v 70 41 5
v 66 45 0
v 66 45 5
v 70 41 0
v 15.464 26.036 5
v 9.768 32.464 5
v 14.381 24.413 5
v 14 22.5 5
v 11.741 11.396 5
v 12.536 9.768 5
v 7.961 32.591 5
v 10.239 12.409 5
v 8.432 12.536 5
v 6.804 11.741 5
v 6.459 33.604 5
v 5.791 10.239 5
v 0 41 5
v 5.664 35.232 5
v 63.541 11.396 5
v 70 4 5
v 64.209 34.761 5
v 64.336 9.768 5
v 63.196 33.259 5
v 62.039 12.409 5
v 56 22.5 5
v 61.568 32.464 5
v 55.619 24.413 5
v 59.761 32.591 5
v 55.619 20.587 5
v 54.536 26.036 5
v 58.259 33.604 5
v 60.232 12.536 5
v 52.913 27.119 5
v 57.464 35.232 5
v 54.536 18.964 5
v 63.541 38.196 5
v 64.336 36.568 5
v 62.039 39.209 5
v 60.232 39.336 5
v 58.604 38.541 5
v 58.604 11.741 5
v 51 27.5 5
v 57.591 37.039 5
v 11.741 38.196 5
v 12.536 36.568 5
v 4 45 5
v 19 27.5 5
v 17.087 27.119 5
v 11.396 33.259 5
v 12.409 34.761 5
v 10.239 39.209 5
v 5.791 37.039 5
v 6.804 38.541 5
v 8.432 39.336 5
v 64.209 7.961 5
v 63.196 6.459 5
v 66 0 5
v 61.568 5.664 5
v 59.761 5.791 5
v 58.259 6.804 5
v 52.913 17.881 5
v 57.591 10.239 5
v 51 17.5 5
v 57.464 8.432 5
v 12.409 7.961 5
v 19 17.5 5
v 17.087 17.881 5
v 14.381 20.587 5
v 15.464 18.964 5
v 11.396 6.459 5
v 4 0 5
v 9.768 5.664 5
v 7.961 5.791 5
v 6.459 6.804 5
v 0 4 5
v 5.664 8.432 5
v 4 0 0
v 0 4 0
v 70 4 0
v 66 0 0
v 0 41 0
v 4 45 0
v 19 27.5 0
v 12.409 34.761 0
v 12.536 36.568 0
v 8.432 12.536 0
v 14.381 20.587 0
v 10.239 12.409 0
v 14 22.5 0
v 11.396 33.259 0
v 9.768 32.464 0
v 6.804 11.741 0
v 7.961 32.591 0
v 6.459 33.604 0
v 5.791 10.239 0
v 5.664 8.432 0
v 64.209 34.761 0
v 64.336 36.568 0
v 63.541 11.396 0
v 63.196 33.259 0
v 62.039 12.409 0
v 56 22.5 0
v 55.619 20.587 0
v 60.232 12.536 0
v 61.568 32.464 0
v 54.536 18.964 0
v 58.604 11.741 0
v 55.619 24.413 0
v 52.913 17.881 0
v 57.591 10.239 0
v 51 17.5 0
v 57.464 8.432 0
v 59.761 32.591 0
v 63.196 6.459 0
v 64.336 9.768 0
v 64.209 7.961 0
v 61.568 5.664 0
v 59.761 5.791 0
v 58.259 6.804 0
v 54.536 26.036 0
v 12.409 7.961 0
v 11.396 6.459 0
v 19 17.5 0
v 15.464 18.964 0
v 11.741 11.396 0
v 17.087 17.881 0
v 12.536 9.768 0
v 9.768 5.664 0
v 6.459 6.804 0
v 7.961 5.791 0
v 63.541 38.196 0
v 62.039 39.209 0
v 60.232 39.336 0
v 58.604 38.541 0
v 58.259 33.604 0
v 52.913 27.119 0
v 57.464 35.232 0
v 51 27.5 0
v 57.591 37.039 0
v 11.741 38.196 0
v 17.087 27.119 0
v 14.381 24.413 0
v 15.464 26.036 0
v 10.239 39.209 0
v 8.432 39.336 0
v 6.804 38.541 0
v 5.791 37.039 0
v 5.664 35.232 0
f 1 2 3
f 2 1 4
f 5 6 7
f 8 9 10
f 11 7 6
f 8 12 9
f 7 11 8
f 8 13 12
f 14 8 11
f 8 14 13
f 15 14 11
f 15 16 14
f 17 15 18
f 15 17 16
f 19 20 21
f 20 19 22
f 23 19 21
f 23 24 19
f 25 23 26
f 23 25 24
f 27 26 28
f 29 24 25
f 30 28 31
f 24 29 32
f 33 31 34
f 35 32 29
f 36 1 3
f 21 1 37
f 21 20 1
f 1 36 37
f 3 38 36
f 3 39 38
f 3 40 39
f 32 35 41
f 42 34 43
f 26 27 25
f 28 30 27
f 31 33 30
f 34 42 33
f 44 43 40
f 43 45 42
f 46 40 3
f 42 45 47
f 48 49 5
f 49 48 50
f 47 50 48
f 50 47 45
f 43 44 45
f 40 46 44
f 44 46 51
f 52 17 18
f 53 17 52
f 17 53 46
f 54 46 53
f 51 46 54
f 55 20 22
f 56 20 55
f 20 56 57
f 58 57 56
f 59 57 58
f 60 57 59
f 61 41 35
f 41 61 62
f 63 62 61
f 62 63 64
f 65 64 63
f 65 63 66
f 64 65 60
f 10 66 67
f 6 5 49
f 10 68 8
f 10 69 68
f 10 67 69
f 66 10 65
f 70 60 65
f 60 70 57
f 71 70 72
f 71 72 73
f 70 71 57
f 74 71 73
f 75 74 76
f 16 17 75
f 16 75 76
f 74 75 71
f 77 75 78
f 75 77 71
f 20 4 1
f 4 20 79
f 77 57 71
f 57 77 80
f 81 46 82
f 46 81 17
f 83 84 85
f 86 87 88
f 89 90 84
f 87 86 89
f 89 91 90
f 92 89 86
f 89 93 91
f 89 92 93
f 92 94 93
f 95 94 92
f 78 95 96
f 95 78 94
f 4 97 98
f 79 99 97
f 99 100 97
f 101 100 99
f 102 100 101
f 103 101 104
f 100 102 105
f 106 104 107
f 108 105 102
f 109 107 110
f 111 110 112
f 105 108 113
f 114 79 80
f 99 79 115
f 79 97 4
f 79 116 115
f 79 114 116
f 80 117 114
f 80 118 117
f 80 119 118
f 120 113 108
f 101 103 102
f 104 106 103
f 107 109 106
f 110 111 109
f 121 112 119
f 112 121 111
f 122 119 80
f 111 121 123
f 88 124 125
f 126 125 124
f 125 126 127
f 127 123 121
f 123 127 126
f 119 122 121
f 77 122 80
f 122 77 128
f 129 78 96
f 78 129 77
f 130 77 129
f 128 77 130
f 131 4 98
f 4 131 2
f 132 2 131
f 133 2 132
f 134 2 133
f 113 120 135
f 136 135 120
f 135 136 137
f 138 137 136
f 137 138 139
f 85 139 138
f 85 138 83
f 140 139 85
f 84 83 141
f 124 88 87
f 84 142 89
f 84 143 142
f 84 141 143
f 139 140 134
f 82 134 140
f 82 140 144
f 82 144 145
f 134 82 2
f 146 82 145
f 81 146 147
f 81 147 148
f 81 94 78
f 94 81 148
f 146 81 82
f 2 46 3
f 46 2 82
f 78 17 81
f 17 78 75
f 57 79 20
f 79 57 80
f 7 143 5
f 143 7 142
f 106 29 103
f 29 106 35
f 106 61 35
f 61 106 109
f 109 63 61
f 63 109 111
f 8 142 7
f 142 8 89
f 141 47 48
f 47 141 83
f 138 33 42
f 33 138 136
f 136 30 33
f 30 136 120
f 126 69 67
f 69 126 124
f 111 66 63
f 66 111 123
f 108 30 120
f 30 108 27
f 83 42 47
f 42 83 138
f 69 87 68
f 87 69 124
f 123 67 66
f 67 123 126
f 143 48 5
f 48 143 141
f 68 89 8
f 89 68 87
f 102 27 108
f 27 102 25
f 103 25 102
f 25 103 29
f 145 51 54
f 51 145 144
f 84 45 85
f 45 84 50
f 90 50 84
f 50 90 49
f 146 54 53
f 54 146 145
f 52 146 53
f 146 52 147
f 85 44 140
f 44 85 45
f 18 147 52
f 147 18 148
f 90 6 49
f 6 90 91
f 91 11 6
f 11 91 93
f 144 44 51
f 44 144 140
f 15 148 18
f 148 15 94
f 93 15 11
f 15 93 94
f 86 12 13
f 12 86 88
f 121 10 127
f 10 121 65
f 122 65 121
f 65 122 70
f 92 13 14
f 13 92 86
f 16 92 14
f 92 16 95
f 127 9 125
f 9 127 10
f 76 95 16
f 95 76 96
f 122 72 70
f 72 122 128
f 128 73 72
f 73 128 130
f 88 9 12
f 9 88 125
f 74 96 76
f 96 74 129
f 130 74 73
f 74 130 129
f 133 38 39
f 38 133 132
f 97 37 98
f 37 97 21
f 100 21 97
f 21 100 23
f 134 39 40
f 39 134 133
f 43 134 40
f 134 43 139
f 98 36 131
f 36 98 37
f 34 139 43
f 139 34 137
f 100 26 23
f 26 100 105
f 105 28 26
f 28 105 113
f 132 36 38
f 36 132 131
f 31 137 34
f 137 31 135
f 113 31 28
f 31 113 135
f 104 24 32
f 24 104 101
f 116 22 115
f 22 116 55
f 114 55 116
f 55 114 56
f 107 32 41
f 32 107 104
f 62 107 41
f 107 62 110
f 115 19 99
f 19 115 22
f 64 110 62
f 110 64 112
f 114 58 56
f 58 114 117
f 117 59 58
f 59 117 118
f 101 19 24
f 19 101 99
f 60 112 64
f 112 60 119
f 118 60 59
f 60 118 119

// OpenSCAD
$fn = 32;

// ----------------------------------------------------------------------
// Bracket plate: slot plate 70 x 45
// ----------------------------------------------------------------------

// --- parameters (mm) ---
hole_r = 3.5;             // bolt hole radius
plate_t = 5;              // plate thickness, Z (extrusion height)
plate_l = 70;             // plate length
plate_w = 45;             // plate width
slot_l = 32;              // slot straight length
slot_r = 5;               // slot end radius

slot_len = slot_l + 2 * slot_r;
slot_w = 2 * slot_r;
hole_d2 = 2 * hole_r;

profile = [[4, 0], [66, 0], [70, 4], [70, 41], [66, 45], [4, 45], [0, 41], [0, 4]];  // primary outline, 8 points, counter clockwise
void_1 = [[51, 17.5], [52.913, 17.881], [54.536, 18.964], [55.619, 20.587], [56, 22.5], [55.619, 24.413], [54.536, 26.036], [52.913, 27.119], [51, 27.5], [19, 27.5], [17.087, 27.119], [15.464, 26.036], [14.381, 24.413], [14, 22.5], [14.381, 20.587], [15.464, 18.964], [17.087, 17.881], [19, 17.5]];  // grip slot, 18 points
void_2 = [[12.536, 36.568], [11.741, 38.196], [10.239, 39.209], [8.432, 39.336], [6.804, 38.541], [5.791, 37.039], [5.664, 35.232], [6.459, 33.604], [7.961, 32.591], [9.768, 32.464], [11.396, 33.259], [12.409, 34.761]];  // corner hole, 12 points
void_3 = [[12.536, 9.768], [11.741, 11.396], [10.239, 12.409], [8.432, 12.536], [6.804, 11.741], [5.791, 10.239], [5.664, 8.432], [6.459, 6.804], [7.961, 5.791], [9.768, 5.664], [11.396, 6.459], [12.409, 7.961]];  // corner hole, 12 points
void_4 = [[64.336, 36.568], [63.541, 38.196], [62.039, 39.209], [60.232, 39.336], [58.604, 38.541], [57.591, 37.039], [57.464, 35.232], [58.259, 33.604], [59.761, 32.591], [61.568, 32.464], [63.196, 33.259], [64.209, 34.761]];  // corner hole, 12 points
void_5 = [[64.336, 9.768], [63.541, 11.396], [62.039, 12.409], [60.232, 12.536], [58.604, 11.741], [57.591, 10.239], [57.464, 8.432], [58.259, 6.804], [59.761, 5.791], [61.568, 5.664], [63.196, 6.459], [64.209, 7.961]];  // corner hole, 12 points

// --- the one profile operation ---
difference() {
  linear_extrude(height = plate_t) polygon(points = profile);
  translate([0, 0, -1])
    linear_extrude(height = plate_t + 2) polygon(points = void_1);
  translate([0, 0, -1])
    linear_extrude(height = plate_t + 2) polygon(points = void_2);
  translate([0, 0, -1])
    linear_extrude(height = plate_t + 2) polygon(points = void_3);
  translate([0, 0, -1])
    linear_extrude(height = plate_t + 2) polygon(points = void_4);
  translate([0, 0, -1])
    linear_extrude(height = plate_t + 2) polygon(points = void_5);
}
